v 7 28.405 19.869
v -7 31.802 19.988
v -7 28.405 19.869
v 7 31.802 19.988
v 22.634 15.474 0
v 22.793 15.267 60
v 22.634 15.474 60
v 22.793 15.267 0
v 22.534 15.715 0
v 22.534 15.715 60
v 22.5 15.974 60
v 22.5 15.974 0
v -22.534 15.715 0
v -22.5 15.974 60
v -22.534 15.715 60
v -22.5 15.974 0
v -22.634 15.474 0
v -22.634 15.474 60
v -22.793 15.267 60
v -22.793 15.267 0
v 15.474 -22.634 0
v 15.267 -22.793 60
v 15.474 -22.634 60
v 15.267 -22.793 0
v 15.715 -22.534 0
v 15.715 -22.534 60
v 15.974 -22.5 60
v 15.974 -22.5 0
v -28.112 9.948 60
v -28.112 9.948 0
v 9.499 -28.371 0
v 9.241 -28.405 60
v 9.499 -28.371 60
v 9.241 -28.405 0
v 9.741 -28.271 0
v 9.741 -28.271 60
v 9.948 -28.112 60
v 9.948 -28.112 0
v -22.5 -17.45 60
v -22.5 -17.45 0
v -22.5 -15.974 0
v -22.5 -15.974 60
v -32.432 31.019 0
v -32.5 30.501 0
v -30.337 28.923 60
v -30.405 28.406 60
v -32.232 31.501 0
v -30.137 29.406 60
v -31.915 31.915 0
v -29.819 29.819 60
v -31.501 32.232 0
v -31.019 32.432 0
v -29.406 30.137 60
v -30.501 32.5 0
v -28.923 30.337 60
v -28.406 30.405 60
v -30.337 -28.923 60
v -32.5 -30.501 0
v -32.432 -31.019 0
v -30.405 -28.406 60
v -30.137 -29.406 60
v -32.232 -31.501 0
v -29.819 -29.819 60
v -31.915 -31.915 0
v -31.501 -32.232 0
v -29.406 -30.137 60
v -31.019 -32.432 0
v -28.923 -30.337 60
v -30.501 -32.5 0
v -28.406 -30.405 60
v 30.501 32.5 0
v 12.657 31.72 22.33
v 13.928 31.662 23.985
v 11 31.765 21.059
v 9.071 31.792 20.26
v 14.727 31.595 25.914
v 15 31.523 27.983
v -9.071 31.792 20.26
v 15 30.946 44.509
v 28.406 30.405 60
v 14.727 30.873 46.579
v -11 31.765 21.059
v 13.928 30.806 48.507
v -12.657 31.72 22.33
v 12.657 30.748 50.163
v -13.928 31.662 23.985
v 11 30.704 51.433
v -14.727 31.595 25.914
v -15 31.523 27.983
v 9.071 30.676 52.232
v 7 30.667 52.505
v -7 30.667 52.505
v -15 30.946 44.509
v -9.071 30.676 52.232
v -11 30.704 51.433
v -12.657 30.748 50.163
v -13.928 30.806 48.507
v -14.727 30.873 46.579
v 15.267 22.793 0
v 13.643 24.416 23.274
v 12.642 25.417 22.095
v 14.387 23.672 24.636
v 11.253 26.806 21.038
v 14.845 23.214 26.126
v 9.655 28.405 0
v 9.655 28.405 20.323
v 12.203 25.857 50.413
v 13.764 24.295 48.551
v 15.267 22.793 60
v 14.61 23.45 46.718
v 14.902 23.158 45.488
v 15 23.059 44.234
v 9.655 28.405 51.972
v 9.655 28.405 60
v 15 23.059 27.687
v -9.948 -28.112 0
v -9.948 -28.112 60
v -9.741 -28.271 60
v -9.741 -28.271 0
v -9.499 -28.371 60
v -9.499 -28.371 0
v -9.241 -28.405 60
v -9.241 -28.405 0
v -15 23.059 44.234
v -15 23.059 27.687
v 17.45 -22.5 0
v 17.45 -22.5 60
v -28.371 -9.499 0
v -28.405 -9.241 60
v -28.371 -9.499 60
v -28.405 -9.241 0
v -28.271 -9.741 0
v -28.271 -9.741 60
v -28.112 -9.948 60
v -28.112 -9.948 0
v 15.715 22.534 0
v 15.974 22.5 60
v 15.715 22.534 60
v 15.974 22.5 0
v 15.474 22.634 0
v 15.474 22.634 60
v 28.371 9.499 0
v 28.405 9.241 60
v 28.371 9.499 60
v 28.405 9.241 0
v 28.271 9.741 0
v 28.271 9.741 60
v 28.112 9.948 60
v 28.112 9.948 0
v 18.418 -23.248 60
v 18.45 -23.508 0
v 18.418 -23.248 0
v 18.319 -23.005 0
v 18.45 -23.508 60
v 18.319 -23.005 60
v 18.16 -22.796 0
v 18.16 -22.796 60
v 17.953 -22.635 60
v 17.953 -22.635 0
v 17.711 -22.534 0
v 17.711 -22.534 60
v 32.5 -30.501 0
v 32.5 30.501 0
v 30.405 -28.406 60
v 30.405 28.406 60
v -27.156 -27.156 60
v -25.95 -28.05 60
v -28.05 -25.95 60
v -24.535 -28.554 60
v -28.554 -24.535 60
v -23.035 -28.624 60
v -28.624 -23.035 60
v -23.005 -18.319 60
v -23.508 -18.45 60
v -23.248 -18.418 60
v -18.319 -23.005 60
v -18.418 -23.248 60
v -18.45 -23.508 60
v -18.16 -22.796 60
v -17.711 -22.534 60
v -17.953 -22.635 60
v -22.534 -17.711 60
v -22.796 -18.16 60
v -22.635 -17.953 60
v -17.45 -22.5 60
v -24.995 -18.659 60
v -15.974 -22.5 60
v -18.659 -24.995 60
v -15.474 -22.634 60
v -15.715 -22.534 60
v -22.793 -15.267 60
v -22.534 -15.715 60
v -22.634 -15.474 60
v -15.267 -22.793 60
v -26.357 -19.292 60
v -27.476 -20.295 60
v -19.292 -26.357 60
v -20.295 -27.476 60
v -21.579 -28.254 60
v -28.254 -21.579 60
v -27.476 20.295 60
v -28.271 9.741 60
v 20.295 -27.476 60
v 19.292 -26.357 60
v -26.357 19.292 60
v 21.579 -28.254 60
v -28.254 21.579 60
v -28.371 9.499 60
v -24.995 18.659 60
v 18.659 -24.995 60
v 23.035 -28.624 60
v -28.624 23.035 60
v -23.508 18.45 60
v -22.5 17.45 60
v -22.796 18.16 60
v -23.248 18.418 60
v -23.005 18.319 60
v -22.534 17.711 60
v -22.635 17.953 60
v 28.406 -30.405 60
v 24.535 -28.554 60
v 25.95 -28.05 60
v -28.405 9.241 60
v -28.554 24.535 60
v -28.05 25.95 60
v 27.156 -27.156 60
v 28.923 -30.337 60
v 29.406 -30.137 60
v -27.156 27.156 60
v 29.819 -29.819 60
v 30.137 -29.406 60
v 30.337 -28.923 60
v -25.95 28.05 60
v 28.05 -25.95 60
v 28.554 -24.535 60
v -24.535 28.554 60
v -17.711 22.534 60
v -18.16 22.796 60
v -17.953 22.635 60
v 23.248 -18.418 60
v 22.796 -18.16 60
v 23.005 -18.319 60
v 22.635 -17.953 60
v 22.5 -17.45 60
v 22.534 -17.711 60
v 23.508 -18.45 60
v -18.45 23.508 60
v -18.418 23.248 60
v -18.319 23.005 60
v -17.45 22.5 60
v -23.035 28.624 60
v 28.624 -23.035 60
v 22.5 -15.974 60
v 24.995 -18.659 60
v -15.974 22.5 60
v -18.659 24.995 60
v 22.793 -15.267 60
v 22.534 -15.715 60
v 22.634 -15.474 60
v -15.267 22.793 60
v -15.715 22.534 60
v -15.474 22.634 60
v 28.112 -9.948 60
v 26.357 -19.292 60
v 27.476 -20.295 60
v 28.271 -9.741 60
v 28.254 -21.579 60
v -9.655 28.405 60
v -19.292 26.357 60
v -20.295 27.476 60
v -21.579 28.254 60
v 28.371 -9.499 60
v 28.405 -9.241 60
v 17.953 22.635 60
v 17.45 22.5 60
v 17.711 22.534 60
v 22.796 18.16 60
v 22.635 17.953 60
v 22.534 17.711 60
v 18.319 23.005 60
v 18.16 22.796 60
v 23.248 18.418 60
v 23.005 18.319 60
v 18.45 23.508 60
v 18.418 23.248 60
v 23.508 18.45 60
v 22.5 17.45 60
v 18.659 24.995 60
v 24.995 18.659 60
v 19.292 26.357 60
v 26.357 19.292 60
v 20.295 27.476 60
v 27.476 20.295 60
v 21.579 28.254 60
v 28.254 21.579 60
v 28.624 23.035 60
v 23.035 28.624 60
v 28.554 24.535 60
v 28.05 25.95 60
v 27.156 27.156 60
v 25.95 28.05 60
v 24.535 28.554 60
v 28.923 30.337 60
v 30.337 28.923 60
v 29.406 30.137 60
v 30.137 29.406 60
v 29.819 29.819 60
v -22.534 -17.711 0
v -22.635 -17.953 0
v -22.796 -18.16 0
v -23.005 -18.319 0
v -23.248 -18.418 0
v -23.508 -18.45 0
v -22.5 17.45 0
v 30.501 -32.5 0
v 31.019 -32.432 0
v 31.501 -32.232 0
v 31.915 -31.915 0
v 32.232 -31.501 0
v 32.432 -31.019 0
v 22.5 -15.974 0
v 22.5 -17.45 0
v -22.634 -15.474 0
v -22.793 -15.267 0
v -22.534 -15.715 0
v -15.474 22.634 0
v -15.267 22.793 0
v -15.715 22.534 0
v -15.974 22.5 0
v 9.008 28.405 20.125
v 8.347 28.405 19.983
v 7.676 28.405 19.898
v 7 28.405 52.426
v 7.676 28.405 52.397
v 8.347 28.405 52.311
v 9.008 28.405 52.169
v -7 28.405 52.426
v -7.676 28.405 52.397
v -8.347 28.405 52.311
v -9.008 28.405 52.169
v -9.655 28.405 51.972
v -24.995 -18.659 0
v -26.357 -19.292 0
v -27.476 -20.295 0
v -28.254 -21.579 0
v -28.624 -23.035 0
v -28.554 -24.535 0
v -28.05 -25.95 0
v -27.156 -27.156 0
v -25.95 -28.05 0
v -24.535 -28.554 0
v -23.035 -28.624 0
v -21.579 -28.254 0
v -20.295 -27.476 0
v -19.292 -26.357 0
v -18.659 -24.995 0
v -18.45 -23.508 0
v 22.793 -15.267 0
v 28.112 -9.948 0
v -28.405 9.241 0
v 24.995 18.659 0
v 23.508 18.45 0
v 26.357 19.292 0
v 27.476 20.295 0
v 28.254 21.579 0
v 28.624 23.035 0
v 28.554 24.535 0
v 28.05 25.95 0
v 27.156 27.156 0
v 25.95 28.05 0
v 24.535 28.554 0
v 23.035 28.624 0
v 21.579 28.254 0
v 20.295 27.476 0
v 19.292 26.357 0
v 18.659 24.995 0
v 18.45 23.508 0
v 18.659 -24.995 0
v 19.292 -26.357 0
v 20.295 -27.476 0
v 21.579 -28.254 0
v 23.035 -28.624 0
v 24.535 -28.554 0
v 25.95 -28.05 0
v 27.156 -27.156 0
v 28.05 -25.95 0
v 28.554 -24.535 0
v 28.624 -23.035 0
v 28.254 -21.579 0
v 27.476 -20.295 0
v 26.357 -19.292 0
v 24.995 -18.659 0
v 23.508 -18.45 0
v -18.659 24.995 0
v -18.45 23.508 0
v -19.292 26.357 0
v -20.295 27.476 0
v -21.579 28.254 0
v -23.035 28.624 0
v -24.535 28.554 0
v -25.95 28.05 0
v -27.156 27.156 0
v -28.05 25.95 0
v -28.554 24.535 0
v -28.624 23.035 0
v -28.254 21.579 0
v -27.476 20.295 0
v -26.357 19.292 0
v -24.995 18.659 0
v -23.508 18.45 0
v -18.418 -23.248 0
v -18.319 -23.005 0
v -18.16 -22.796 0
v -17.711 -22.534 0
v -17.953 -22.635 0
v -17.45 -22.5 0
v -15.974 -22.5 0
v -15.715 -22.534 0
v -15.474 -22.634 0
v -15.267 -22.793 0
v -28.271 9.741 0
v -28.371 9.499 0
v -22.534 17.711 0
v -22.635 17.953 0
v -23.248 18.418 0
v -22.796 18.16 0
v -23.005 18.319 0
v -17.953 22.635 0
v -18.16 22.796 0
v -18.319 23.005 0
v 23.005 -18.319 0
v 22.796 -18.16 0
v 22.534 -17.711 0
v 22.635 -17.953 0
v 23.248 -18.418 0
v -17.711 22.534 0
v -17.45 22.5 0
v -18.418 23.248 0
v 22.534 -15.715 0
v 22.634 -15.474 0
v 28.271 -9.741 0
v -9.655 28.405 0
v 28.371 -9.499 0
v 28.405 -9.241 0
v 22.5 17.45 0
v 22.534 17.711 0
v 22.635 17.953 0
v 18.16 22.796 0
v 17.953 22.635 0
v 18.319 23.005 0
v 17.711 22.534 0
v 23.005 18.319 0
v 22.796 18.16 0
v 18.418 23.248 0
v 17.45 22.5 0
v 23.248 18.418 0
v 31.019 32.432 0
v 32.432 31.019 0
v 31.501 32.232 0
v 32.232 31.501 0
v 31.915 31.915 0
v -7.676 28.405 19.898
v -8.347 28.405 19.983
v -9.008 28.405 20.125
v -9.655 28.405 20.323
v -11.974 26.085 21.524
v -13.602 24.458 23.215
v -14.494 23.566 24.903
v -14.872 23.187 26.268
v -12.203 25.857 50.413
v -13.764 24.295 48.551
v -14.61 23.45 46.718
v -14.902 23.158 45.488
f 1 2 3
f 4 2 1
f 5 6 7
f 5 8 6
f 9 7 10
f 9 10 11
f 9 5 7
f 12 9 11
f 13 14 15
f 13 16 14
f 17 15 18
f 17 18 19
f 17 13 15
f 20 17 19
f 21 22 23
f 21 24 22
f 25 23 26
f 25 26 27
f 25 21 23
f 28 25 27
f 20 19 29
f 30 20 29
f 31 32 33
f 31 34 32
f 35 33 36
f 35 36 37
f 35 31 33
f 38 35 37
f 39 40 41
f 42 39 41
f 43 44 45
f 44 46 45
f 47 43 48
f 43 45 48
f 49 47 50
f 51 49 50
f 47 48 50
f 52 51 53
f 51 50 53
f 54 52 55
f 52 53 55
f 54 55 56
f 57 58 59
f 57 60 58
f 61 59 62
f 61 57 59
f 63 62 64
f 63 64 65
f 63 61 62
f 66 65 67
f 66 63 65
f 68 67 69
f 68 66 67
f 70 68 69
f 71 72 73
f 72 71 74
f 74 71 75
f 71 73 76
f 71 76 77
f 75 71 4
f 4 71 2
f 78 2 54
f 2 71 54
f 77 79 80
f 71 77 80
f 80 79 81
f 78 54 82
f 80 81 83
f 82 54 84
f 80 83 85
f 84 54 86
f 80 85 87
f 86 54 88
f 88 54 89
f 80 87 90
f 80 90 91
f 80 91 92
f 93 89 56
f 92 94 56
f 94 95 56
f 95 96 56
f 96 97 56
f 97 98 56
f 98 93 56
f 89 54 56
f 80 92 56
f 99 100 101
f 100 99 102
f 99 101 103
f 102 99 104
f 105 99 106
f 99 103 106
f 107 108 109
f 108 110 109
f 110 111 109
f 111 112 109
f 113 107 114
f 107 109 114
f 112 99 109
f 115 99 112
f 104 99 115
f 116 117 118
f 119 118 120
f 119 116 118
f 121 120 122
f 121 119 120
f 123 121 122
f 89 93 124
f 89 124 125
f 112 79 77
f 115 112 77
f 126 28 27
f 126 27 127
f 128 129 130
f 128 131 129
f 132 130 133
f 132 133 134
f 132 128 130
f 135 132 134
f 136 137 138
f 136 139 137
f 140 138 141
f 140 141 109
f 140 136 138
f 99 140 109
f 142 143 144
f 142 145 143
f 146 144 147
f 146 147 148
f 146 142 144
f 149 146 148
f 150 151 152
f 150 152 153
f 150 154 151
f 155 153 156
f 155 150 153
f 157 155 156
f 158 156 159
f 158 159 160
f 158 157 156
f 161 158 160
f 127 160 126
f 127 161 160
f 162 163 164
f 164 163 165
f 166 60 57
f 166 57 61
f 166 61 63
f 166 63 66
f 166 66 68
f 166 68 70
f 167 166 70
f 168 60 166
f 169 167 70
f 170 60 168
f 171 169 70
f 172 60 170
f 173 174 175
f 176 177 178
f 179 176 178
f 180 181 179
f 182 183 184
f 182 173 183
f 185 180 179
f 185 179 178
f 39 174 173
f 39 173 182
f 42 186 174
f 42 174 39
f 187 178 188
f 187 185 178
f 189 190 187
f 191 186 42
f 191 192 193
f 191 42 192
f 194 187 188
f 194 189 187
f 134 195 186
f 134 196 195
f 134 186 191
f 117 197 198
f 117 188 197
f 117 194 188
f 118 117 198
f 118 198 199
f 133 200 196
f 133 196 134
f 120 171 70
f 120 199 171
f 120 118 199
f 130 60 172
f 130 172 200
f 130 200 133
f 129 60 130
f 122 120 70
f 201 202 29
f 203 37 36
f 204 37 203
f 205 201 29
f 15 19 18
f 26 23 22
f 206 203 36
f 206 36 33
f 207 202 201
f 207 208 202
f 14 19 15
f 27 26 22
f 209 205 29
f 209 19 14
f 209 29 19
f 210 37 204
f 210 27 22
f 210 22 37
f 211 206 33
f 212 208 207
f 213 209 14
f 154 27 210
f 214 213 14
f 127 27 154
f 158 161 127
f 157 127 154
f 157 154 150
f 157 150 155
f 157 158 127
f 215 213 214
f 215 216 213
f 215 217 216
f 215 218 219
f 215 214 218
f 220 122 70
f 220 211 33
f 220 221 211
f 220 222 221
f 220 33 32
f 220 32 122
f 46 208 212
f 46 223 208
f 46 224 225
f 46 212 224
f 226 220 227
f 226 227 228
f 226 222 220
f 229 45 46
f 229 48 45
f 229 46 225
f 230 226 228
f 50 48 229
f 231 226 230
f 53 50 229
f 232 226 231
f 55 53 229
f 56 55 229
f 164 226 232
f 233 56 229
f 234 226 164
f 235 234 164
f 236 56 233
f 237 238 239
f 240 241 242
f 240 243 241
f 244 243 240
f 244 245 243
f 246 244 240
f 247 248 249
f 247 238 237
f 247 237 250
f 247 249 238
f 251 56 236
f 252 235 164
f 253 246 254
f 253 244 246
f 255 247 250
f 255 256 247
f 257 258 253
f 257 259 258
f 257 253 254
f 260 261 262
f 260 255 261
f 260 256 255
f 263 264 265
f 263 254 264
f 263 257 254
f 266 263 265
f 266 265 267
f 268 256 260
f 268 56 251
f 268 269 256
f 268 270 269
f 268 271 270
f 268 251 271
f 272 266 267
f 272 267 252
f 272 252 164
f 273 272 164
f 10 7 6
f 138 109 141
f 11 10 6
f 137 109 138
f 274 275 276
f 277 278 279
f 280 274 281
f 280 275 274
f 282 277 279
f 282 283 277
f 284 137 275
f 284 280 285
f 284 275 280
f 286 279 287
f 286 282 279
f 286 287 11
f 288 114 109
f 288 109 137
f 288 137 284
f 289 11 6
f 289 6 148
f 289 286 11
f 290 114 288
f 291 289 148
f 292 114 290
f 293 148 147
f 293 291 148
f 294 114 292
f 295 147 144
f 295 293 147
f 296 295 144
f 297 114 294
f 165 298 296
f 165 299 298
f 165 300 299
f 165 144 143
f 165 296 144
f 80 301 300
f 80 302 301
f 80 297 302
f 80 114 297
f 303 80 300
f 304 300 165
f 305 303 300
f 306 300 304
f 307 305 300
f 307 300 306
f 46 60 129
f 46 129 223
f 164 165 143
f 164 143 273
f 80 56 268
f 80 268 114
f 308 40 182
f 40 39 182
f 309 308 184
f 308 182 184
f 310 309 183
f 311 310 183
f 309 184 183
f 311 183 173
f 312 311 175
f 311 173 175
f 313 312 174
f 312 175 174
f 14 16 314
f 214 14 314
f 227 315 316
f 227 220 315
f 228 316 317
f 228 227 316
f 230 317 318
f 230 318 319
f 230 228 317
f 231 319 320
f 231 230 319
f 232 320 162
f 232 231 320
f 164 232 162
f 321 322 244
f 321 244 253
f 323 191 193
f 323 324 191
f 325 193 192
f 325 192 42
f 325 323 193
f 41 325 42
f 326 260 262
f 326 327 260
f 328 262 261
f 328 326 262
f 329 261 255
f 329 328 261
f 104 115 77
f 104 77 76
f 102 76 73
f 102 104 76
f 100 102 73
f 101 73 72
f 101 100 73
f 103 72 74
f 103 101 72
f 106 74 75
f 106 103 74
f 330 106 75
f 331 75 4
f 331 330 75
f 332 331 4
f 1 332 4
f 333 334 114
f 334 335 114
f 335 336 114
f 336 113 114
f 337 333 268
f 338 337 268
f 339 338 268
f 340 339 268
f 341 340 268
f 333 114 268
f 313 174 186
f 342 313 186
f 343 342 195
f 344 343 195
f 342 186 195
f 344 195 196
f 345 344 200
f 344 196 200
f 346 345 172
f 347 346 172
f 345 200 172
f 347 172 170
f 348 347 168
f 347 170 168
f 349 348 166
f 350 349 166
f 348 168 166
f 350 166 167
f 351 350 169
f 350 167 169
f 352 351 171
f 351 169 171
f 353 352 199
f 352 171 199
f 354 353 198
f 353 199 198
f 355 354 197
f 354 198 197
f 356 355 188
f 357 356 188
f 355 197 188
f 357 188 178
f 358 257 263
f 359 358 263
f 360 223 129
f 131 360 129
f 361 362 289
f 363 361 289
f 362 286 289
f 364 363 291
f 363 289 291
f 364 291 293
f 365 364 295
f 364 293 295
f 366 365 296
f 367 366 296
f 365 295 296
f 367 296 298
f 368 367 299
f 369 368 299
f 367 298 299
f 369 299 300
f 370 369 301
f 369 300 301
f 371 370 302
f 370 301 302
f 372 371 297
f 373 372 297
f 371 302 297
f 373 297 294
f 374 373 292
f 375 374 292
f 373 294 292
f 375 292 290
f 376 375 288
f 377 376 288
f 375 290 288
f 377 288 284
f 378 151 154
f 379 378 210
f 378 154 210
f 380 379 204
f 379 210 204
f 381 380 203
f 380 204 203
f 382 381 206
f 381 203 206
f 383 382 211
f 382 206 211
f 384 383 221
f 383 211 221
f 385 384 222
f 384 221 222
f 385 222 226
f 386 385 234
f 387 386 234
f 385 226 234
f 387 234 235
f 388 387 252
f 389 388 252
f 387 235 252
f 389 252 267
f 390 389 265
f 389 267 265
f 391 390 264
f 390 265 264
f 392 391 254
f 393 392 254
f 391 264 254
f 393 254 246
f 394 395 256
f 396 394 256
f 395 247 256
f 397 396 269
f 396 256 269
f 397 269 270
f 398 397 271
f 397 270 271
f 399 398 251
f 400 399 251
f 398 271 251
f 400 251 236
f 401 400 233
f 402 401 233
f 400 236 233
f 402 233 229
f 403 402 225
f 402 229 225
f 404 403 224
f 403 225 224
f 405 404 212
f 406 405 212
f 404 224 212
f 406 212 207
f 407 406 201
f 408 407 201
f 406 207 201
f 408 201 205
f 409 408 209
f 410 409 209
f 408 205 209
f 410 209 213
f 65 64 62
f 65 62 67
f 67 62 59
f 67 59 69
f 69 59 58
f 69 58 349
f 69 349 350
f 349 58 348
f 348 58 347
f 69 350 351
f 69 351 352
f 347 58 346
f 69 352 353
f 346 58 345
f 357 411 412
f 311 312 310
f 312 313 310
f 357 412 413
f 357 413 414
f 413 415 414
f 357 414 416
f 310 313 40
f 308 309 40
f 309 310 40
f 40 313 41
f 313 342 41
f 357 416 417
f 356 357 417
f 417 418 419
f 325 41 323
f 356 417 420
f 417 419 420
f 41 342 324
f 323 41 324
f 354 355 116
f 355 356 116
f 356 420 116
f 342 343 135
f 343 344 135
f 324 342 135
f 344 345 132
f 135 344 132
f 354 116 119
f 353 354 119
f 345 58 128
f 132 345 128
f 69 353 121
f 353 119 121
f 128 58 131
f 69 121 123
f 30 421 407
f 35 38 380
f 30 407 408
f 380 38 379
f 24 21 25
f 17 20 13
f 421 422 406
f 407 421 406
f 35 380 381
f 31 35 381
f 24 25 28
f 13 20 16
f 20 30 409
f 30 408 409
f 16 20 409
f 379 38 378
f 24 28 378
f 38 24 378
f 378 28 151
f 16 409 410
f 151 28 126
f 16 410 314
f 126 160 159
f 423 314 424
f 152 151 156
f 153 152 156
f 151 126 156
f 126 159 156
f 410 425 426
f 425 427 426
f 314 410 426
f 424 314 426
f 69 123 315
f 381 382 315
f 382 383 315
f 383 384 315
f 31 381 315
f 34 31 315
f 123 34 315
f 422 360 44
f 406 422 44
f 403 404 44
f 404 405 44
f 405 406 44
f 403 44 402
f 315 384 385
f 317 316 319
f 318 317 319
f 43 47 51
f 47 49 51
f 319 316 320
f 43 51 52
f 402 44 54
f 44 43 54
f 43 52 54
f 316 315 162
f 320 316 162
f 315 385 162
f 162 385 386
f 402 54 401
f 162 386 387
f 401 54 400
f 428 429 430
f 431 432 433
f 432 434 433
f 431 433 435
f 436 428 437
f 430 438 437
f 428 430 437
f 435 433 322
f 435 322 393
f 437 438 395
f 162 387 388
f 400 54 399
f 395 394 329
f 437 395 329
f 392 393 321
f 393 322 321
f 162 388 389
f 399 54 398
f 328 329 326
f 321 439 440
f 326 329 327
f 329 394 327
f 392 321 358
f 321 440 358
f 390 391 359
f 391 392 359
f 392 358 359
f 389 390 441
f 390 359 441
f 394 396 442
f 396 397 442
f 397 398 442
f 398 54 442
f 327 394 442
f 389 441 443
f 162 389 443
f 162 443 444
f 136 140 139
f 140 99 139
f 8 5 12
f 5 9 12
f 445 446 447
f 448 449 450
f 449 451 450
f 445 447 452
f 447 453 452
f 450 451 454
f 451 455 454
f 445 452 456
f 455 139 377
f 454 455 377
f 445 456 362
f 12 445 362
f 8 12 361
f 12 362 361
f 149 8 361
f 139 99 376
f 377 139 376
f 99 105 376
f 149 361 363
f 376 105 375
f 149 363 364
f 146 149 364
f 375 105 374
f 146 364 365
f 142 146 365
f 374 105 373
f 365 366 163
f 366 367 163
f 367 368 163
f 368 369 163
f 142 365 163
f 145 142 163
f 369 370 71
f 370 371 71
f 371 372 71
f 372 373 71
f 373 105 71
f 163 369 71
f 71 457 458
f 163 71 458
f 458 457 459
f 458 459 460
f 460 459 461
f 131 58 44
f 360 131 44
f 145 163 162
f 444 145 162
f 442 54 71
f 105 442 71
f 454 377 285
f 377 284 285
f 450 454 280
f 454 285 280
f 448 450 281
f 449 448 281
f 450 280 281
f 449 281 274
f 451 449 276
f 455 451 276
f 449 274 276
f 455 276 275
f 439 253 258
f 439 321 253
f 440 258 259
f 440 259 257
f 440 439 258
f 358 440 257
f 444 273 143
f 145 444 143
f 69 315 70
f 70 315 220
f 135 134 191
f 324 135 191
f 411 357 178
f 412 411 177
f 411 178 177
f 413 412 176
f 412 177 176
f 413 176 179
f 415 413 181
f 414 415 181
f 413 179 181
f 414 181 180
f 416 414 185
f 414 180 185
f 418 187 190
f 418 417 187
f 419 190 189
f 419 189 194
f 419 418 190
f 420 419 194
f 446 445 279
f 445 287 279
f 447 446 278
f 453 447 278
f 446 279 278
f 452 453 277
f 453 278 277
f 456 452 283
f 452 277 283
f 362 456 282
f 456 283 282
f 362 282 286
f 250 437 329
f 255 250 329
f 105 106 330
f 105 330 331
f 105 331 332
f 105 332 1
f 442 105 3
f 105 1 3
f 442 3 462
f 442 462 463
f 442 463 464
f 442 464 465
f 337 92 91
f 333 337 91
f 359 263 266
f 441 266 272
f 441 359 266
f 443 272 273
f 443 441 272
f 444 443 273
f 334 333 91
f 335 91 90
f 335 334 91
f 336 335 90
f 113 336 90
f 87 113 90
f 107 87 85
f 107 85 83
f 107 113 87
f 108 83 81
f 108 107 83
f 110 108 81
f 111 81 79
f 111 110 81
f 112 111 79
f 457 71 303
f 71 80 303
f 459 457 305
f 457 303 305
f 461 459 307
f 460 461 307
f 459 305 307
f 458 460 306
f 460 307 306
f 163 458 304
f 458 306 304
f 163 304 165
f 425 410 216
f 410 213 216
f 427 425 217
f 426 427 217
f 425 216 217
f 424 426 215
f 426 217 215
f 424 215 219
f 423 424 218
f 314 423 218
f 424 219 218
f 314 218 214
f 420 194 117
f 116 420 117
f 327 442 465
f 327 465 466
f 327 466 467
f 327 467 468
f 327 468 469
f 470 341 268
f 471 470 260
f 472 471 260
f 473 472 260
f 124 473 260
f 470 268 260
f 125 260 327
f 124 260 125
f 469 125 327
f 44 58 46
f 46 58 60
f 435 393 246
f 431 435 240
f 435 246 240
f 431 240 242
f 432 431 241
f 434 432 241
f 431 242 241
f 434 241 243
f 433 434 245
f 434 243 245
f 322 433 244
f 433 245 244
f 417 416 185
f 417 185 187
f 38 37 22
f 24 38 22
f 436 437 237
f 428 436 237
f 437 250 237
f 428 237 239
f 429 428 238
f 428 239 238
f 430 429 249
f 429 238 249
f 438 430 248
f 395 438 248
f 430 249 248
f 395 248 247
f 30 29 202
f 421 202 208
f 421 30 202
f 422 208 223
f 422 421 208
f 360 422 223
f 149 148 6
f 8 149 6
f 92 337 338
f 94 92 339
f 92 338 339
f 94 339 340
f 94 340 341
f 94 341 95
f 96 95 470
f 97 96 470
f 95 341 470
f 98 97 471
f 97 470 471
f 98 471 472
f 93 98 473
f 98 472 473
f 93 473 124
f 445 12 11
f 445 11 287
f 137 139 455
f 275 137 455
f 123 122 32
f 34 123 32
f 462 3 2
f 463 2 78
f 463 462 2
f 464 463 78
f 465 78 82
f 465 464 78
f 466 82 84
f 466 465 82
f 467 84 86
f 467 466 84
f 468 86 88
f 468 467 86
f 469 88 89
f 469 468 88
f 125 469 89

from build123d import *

# Parameters (mm, degrees)
SKETCH1_W           = 65
SKETCH1_H           = 65
BOSS_EXTRUDE1_DEPTH = 60
BOSS_EXTRUDE1_TAPER = 2
CUT_EXTRUDE1_REACH  = 77.581
SKETCH4_R           = 5.1
CUT_EXTRUDE2_REACH  = 77.581
SKETCH5_W           = 45
SKETCH5_H           = 45
CUT_EXTRUDE4_REACH  = 77.581
CUT_EXTRUDE5_REACH  = 95.495
SKETCH7_W           = 30
SKETCH7_H           = 32.536572658
FILLET1_R           = 2
FILLET3_R           = 1
FILLET5_R           = 8


with BuildPart() as part:
    # Sketch1 → Boss-Extrude1 (new body)
    with BuildSketch(Plane.XY):
        Rectangle(SKETCH1_W, SKETCH1_H)
    extrude(amount=BOSS_EXTRUDE1_DEPTH, taper=BOSS_EXTRUDE1_TAPER)

    # Sketch4 → Cut-Extrude1 (cut, up to next)
    with BuildSketch(Plane.XY.offset(60), mode=Mode.PRIVATE) as cut_extrude1_sk1:
        with Locations((-23.550191347, 23.550191347)):
            Circle(SKETCH4_R)
    cut_extrude1_tool1 = extrude(cut_extrude1_sk1.sketch, amount=-CUT_EXTRUDE1_REACH, mode=Mode.PRIVATE) & part.part
    # Sketch4 → Cut-Extrude1 (cut, up to next)
    with BuildSketch(Plane.XY.offset(60), mode=Mode.PRIVATE) as cut_extrude1_sk2:
        with Locations((23.550191347, 23.550191347)):
            Circle(SKETCH4_R)
    cut_extrude1_tool2 = extrude(cut_extrude1_sk2.sketch, amount=-CUT_EXTRUDE1_REACH, mode=Mode.PRIVATE) & part.part
    # Sketch4 → Cut-Extrude1 (cut, up to next)
    with BuildSketch(Plane.XY.offset(60), mode=Mode.PRIVATE) as cut_extrude1_sk3:
        with Locations((23.550191347, -23.550191347)):
            Circle(SKETCH4_R)
    cut_extrude1_tool3 = extrude(cut_extrude1_sk3.sketch, amount=-CUT_EXTRUDE1_REACH, mode=Mode.PRIVATE) & part.part
    # Sketch4 → Cut-Extrude1 (cut, up to next)
    with BuildSketch(Plane.XY.offset(60), mode=Mode.PRIVATE) as cut_extrude1_sk4:
        with Locations((-23.550191347, -23.550191347)):
            Circle(SKETCH4_R)
    cut_extrude1_tool4 = extrude(cut_extrude1_sk4.sketch, amount=-CUT_EXTRUDE1_REACH, mode=Mode.PRIVATE) & part.part
    add(cut_extrude1_tool1.solids().sort_by_distance((-23.550191, 23.550191, 60))[0], mode=Mode.SUBTRACT)
    add(cut_extrude1_tool2.solids().sort_by_distance((23.550191, 23.550191, 60))[0], mode=Mode.SUBTRACT)
    add(cut_extrude1_tool3.solids().sort_by_distance((23.550191, -23.550191, 60))[0], mode=Mode.SUBTRACT)
    add(cut_extrude1_tool4.solids().sort_by_distance((-23.550191, -23.550191, 60))[0], mode=Mode.SUBTRACT)

    # Sketch5 → Cut-Extrude2 (cut, up to next)
    with BuildSketch(Plane.XY.offset(60), mode=Mode.PRIVATE) as cut_extrude2_sk1:
        Rectangle(SKETCH5_W, SKETCH5_H)
    cut_extrude2_tool1 = extrude(cut_extrude2_sk1.sketch, amount=-CUT_EXTRUDE2_REACH, mode=Mode.PRIVATE) & part.part
    add(cut_extrude2_tool1.solids().sort_by_distance((0, 0, 60))[0], mode=Mode.SUBTRACT)

    # Sketch6 → Cut-Extrude4 (cut, up to next)
    with BuildSketch(Plane.XY.offset(60), mode=Mode.PRIVATE) as cut_extrude4_sk1:
        Polygon((-22.5, -15.559490181), (-22.5, 15.559490181), (-28.40475383, 9.65473635), (-28.40475383, -9.65473635), align=None)
    cut_extrude4_tool1 = extrude(cut_extrude4_sk1.sketch, amount=-CUT_EXTRUDE4_REACH, mode=Mode.PRIVATE) & part.part
    # Sketch6 → Cut-Extrude4 (cut, up to next)
    with BuildSketch(Plane.XY.offset(60), mode=Mode.PRIVATE) as cut_extrude4_sk2:
        Polygon((-15.559490181, 22.5), (15.559490181, 22.5), (9.65473635, 28.40475383), (-9.65473635, 28.40475383), align=None)
    cut_extrude4_tool2 = extrude(cut_extrude4_sk2.sketch, amount=-CUT_EXTRUDE4_REACH, mode=Mode.PRIVATE) & part.part
    # Sketch6 → Cut-Extrude4 (cut, up to next)
    with BuildSketch(Plane.XY.offset(60), mode=Mode.PRIVATE) as cut_extrude4_sk3:
        Polygon((22.5, 15.559490181), (22.5, -15.559490181), (28.40475383, -9.65473635), (28.40475383, 9.65473635), align=None)
    cut_extrude4_tool3 = extrude(cut_extrude4_sk3.sketch, amount=-CUT_EXTRUDE4_REACH, mode=Mode.PRIVATE) & part.part
    # Sketch6 → Cut-Extrude4 (cut, up to next)
    with BuildSketch(Plane.XY.offset(60), mode=Mode.PRIVATE) as cut_extrude4_sk4:
        Polygon((15.559490181, -22.5), (-15.559490181, -22.5), (-9.65473635, -28.40475383), (9.65473635, -28.40475383), align=None)
    cut_extrude4_tool4 = extrude(cut_extrude4_sk4.sketch, amount=-CUT_EXTRUDE4_REACH, mode=Mode.PRIVATE) & part.part
    add(cut_extrude4_tool1.solids().sort_by_distance((-25.221911, 0, 60))[0], mode=Mode.SUBTRACT)
    add(cut_extrude4_tool2.solids().sort_by_distance((0, 25.221911, 60))[0], mode=Mode.SUBTRACT)
    add(cut_extrude4_tool3.solids().sort_by_distance((25.221911, 0, 60))[0], mode=Mode.SUBTRACT)
    add(cut_extrude4_tool4.solids().sort_by_distance((0, -25.221911, 60))[0], mode=Mode.SUBTRACT)

    # Sketch7 → Cut-Extrude5 (cut, up to next)
    with BuildSketch(Plane(origin=(0, 32.460415817, 1.133542698), x_dir=(1, 0, 0), z_dir=(0, 0.9993908270190958, 0.034899496702501046)), mode=Mode.PRIVATE) as cut_extrude5_sk1:
        with Locations((0, -35.134052686)):
            Rectangle(SKETCH7_W, SKETCH7_H)
    cut_extrude5_tool1 = extrude(cut_extrude5_sk1.sketch, amount=-CUT_EXTRUDE5_REACH, mode=Mode.PRIVATE) & part.part
    add(cut_extrude5_tool1.solids().sort_by_distance((0, 31.234255, 36.246193))[0], mode=Mode.SUBTRACT)

    # Fillet1
    fillet1_edges = [part.edges().sort_by_distance(p)[0] for p in [
        (-31.452376453, 31.452376453, 30.000013228),
        (31.452376915, 31.452376915, 30),
        (31.452376453, -31.452376453, 30.000013228),
        (-31.452376915, -31.452376915, 30),
    ]]
    fillet(fillet1_edges, radius=FILLET1_R)

    # Fillet3
    fillet3_edges = [part.edges().sort_by_distance(p)[0] for p in [
        (-22.5, -15.559490181, 30),
        (-28.40475383, -9.65473635, 30),
        (-28.40475383, 9.65473635, 30),
        (-22.5, 15.559490181, 30),
        (-22.5, 18.559490181, 30),
        (-18.559490181, 22.5, 30),
        (18.559490181, 22.5, 30),
        (22.5, 18.559490181, 30),
        (22.5, -18.559490181, 30),
        (18.559490181, -22.5, 30),
        (-22.5, -18.559490181, 30),
        (-18.559490181, -22.5, 30),
        (15.559490181, -22.5, 30),
        (9.65473635, -28.40475383, 30),
        (-9.65473635, -28.40475383, 30),
        (-15.559490181, -22.5, 30),
        (-15.559490181, 22.5, 30),
        (15.559490181, 22.5, 30),
        (22.5, 15.559490181, 30),
        (28.40475383, 9.65473635, 30),
        (28.40475383, -9.65473635, 30),
        (22.5, -15.559490181, 30),
    ]]
    fillet(fillet3_edges, radius=FILLET3_R)

    # Fillet5
    fillet5_edges = [part.edges().sort_by_distance(p)[0] for p in [
        (15, 26.862995118, 52.371747478),
        (-15, 26.862995118, 52.371747478),
        (15, 27.430750123, 19.83516878),
        (-15, 27.430750123, 19.83516878),
    ]]
    fillet(fillet5_edges, radius=FILLET5_R)


solid = part.part
